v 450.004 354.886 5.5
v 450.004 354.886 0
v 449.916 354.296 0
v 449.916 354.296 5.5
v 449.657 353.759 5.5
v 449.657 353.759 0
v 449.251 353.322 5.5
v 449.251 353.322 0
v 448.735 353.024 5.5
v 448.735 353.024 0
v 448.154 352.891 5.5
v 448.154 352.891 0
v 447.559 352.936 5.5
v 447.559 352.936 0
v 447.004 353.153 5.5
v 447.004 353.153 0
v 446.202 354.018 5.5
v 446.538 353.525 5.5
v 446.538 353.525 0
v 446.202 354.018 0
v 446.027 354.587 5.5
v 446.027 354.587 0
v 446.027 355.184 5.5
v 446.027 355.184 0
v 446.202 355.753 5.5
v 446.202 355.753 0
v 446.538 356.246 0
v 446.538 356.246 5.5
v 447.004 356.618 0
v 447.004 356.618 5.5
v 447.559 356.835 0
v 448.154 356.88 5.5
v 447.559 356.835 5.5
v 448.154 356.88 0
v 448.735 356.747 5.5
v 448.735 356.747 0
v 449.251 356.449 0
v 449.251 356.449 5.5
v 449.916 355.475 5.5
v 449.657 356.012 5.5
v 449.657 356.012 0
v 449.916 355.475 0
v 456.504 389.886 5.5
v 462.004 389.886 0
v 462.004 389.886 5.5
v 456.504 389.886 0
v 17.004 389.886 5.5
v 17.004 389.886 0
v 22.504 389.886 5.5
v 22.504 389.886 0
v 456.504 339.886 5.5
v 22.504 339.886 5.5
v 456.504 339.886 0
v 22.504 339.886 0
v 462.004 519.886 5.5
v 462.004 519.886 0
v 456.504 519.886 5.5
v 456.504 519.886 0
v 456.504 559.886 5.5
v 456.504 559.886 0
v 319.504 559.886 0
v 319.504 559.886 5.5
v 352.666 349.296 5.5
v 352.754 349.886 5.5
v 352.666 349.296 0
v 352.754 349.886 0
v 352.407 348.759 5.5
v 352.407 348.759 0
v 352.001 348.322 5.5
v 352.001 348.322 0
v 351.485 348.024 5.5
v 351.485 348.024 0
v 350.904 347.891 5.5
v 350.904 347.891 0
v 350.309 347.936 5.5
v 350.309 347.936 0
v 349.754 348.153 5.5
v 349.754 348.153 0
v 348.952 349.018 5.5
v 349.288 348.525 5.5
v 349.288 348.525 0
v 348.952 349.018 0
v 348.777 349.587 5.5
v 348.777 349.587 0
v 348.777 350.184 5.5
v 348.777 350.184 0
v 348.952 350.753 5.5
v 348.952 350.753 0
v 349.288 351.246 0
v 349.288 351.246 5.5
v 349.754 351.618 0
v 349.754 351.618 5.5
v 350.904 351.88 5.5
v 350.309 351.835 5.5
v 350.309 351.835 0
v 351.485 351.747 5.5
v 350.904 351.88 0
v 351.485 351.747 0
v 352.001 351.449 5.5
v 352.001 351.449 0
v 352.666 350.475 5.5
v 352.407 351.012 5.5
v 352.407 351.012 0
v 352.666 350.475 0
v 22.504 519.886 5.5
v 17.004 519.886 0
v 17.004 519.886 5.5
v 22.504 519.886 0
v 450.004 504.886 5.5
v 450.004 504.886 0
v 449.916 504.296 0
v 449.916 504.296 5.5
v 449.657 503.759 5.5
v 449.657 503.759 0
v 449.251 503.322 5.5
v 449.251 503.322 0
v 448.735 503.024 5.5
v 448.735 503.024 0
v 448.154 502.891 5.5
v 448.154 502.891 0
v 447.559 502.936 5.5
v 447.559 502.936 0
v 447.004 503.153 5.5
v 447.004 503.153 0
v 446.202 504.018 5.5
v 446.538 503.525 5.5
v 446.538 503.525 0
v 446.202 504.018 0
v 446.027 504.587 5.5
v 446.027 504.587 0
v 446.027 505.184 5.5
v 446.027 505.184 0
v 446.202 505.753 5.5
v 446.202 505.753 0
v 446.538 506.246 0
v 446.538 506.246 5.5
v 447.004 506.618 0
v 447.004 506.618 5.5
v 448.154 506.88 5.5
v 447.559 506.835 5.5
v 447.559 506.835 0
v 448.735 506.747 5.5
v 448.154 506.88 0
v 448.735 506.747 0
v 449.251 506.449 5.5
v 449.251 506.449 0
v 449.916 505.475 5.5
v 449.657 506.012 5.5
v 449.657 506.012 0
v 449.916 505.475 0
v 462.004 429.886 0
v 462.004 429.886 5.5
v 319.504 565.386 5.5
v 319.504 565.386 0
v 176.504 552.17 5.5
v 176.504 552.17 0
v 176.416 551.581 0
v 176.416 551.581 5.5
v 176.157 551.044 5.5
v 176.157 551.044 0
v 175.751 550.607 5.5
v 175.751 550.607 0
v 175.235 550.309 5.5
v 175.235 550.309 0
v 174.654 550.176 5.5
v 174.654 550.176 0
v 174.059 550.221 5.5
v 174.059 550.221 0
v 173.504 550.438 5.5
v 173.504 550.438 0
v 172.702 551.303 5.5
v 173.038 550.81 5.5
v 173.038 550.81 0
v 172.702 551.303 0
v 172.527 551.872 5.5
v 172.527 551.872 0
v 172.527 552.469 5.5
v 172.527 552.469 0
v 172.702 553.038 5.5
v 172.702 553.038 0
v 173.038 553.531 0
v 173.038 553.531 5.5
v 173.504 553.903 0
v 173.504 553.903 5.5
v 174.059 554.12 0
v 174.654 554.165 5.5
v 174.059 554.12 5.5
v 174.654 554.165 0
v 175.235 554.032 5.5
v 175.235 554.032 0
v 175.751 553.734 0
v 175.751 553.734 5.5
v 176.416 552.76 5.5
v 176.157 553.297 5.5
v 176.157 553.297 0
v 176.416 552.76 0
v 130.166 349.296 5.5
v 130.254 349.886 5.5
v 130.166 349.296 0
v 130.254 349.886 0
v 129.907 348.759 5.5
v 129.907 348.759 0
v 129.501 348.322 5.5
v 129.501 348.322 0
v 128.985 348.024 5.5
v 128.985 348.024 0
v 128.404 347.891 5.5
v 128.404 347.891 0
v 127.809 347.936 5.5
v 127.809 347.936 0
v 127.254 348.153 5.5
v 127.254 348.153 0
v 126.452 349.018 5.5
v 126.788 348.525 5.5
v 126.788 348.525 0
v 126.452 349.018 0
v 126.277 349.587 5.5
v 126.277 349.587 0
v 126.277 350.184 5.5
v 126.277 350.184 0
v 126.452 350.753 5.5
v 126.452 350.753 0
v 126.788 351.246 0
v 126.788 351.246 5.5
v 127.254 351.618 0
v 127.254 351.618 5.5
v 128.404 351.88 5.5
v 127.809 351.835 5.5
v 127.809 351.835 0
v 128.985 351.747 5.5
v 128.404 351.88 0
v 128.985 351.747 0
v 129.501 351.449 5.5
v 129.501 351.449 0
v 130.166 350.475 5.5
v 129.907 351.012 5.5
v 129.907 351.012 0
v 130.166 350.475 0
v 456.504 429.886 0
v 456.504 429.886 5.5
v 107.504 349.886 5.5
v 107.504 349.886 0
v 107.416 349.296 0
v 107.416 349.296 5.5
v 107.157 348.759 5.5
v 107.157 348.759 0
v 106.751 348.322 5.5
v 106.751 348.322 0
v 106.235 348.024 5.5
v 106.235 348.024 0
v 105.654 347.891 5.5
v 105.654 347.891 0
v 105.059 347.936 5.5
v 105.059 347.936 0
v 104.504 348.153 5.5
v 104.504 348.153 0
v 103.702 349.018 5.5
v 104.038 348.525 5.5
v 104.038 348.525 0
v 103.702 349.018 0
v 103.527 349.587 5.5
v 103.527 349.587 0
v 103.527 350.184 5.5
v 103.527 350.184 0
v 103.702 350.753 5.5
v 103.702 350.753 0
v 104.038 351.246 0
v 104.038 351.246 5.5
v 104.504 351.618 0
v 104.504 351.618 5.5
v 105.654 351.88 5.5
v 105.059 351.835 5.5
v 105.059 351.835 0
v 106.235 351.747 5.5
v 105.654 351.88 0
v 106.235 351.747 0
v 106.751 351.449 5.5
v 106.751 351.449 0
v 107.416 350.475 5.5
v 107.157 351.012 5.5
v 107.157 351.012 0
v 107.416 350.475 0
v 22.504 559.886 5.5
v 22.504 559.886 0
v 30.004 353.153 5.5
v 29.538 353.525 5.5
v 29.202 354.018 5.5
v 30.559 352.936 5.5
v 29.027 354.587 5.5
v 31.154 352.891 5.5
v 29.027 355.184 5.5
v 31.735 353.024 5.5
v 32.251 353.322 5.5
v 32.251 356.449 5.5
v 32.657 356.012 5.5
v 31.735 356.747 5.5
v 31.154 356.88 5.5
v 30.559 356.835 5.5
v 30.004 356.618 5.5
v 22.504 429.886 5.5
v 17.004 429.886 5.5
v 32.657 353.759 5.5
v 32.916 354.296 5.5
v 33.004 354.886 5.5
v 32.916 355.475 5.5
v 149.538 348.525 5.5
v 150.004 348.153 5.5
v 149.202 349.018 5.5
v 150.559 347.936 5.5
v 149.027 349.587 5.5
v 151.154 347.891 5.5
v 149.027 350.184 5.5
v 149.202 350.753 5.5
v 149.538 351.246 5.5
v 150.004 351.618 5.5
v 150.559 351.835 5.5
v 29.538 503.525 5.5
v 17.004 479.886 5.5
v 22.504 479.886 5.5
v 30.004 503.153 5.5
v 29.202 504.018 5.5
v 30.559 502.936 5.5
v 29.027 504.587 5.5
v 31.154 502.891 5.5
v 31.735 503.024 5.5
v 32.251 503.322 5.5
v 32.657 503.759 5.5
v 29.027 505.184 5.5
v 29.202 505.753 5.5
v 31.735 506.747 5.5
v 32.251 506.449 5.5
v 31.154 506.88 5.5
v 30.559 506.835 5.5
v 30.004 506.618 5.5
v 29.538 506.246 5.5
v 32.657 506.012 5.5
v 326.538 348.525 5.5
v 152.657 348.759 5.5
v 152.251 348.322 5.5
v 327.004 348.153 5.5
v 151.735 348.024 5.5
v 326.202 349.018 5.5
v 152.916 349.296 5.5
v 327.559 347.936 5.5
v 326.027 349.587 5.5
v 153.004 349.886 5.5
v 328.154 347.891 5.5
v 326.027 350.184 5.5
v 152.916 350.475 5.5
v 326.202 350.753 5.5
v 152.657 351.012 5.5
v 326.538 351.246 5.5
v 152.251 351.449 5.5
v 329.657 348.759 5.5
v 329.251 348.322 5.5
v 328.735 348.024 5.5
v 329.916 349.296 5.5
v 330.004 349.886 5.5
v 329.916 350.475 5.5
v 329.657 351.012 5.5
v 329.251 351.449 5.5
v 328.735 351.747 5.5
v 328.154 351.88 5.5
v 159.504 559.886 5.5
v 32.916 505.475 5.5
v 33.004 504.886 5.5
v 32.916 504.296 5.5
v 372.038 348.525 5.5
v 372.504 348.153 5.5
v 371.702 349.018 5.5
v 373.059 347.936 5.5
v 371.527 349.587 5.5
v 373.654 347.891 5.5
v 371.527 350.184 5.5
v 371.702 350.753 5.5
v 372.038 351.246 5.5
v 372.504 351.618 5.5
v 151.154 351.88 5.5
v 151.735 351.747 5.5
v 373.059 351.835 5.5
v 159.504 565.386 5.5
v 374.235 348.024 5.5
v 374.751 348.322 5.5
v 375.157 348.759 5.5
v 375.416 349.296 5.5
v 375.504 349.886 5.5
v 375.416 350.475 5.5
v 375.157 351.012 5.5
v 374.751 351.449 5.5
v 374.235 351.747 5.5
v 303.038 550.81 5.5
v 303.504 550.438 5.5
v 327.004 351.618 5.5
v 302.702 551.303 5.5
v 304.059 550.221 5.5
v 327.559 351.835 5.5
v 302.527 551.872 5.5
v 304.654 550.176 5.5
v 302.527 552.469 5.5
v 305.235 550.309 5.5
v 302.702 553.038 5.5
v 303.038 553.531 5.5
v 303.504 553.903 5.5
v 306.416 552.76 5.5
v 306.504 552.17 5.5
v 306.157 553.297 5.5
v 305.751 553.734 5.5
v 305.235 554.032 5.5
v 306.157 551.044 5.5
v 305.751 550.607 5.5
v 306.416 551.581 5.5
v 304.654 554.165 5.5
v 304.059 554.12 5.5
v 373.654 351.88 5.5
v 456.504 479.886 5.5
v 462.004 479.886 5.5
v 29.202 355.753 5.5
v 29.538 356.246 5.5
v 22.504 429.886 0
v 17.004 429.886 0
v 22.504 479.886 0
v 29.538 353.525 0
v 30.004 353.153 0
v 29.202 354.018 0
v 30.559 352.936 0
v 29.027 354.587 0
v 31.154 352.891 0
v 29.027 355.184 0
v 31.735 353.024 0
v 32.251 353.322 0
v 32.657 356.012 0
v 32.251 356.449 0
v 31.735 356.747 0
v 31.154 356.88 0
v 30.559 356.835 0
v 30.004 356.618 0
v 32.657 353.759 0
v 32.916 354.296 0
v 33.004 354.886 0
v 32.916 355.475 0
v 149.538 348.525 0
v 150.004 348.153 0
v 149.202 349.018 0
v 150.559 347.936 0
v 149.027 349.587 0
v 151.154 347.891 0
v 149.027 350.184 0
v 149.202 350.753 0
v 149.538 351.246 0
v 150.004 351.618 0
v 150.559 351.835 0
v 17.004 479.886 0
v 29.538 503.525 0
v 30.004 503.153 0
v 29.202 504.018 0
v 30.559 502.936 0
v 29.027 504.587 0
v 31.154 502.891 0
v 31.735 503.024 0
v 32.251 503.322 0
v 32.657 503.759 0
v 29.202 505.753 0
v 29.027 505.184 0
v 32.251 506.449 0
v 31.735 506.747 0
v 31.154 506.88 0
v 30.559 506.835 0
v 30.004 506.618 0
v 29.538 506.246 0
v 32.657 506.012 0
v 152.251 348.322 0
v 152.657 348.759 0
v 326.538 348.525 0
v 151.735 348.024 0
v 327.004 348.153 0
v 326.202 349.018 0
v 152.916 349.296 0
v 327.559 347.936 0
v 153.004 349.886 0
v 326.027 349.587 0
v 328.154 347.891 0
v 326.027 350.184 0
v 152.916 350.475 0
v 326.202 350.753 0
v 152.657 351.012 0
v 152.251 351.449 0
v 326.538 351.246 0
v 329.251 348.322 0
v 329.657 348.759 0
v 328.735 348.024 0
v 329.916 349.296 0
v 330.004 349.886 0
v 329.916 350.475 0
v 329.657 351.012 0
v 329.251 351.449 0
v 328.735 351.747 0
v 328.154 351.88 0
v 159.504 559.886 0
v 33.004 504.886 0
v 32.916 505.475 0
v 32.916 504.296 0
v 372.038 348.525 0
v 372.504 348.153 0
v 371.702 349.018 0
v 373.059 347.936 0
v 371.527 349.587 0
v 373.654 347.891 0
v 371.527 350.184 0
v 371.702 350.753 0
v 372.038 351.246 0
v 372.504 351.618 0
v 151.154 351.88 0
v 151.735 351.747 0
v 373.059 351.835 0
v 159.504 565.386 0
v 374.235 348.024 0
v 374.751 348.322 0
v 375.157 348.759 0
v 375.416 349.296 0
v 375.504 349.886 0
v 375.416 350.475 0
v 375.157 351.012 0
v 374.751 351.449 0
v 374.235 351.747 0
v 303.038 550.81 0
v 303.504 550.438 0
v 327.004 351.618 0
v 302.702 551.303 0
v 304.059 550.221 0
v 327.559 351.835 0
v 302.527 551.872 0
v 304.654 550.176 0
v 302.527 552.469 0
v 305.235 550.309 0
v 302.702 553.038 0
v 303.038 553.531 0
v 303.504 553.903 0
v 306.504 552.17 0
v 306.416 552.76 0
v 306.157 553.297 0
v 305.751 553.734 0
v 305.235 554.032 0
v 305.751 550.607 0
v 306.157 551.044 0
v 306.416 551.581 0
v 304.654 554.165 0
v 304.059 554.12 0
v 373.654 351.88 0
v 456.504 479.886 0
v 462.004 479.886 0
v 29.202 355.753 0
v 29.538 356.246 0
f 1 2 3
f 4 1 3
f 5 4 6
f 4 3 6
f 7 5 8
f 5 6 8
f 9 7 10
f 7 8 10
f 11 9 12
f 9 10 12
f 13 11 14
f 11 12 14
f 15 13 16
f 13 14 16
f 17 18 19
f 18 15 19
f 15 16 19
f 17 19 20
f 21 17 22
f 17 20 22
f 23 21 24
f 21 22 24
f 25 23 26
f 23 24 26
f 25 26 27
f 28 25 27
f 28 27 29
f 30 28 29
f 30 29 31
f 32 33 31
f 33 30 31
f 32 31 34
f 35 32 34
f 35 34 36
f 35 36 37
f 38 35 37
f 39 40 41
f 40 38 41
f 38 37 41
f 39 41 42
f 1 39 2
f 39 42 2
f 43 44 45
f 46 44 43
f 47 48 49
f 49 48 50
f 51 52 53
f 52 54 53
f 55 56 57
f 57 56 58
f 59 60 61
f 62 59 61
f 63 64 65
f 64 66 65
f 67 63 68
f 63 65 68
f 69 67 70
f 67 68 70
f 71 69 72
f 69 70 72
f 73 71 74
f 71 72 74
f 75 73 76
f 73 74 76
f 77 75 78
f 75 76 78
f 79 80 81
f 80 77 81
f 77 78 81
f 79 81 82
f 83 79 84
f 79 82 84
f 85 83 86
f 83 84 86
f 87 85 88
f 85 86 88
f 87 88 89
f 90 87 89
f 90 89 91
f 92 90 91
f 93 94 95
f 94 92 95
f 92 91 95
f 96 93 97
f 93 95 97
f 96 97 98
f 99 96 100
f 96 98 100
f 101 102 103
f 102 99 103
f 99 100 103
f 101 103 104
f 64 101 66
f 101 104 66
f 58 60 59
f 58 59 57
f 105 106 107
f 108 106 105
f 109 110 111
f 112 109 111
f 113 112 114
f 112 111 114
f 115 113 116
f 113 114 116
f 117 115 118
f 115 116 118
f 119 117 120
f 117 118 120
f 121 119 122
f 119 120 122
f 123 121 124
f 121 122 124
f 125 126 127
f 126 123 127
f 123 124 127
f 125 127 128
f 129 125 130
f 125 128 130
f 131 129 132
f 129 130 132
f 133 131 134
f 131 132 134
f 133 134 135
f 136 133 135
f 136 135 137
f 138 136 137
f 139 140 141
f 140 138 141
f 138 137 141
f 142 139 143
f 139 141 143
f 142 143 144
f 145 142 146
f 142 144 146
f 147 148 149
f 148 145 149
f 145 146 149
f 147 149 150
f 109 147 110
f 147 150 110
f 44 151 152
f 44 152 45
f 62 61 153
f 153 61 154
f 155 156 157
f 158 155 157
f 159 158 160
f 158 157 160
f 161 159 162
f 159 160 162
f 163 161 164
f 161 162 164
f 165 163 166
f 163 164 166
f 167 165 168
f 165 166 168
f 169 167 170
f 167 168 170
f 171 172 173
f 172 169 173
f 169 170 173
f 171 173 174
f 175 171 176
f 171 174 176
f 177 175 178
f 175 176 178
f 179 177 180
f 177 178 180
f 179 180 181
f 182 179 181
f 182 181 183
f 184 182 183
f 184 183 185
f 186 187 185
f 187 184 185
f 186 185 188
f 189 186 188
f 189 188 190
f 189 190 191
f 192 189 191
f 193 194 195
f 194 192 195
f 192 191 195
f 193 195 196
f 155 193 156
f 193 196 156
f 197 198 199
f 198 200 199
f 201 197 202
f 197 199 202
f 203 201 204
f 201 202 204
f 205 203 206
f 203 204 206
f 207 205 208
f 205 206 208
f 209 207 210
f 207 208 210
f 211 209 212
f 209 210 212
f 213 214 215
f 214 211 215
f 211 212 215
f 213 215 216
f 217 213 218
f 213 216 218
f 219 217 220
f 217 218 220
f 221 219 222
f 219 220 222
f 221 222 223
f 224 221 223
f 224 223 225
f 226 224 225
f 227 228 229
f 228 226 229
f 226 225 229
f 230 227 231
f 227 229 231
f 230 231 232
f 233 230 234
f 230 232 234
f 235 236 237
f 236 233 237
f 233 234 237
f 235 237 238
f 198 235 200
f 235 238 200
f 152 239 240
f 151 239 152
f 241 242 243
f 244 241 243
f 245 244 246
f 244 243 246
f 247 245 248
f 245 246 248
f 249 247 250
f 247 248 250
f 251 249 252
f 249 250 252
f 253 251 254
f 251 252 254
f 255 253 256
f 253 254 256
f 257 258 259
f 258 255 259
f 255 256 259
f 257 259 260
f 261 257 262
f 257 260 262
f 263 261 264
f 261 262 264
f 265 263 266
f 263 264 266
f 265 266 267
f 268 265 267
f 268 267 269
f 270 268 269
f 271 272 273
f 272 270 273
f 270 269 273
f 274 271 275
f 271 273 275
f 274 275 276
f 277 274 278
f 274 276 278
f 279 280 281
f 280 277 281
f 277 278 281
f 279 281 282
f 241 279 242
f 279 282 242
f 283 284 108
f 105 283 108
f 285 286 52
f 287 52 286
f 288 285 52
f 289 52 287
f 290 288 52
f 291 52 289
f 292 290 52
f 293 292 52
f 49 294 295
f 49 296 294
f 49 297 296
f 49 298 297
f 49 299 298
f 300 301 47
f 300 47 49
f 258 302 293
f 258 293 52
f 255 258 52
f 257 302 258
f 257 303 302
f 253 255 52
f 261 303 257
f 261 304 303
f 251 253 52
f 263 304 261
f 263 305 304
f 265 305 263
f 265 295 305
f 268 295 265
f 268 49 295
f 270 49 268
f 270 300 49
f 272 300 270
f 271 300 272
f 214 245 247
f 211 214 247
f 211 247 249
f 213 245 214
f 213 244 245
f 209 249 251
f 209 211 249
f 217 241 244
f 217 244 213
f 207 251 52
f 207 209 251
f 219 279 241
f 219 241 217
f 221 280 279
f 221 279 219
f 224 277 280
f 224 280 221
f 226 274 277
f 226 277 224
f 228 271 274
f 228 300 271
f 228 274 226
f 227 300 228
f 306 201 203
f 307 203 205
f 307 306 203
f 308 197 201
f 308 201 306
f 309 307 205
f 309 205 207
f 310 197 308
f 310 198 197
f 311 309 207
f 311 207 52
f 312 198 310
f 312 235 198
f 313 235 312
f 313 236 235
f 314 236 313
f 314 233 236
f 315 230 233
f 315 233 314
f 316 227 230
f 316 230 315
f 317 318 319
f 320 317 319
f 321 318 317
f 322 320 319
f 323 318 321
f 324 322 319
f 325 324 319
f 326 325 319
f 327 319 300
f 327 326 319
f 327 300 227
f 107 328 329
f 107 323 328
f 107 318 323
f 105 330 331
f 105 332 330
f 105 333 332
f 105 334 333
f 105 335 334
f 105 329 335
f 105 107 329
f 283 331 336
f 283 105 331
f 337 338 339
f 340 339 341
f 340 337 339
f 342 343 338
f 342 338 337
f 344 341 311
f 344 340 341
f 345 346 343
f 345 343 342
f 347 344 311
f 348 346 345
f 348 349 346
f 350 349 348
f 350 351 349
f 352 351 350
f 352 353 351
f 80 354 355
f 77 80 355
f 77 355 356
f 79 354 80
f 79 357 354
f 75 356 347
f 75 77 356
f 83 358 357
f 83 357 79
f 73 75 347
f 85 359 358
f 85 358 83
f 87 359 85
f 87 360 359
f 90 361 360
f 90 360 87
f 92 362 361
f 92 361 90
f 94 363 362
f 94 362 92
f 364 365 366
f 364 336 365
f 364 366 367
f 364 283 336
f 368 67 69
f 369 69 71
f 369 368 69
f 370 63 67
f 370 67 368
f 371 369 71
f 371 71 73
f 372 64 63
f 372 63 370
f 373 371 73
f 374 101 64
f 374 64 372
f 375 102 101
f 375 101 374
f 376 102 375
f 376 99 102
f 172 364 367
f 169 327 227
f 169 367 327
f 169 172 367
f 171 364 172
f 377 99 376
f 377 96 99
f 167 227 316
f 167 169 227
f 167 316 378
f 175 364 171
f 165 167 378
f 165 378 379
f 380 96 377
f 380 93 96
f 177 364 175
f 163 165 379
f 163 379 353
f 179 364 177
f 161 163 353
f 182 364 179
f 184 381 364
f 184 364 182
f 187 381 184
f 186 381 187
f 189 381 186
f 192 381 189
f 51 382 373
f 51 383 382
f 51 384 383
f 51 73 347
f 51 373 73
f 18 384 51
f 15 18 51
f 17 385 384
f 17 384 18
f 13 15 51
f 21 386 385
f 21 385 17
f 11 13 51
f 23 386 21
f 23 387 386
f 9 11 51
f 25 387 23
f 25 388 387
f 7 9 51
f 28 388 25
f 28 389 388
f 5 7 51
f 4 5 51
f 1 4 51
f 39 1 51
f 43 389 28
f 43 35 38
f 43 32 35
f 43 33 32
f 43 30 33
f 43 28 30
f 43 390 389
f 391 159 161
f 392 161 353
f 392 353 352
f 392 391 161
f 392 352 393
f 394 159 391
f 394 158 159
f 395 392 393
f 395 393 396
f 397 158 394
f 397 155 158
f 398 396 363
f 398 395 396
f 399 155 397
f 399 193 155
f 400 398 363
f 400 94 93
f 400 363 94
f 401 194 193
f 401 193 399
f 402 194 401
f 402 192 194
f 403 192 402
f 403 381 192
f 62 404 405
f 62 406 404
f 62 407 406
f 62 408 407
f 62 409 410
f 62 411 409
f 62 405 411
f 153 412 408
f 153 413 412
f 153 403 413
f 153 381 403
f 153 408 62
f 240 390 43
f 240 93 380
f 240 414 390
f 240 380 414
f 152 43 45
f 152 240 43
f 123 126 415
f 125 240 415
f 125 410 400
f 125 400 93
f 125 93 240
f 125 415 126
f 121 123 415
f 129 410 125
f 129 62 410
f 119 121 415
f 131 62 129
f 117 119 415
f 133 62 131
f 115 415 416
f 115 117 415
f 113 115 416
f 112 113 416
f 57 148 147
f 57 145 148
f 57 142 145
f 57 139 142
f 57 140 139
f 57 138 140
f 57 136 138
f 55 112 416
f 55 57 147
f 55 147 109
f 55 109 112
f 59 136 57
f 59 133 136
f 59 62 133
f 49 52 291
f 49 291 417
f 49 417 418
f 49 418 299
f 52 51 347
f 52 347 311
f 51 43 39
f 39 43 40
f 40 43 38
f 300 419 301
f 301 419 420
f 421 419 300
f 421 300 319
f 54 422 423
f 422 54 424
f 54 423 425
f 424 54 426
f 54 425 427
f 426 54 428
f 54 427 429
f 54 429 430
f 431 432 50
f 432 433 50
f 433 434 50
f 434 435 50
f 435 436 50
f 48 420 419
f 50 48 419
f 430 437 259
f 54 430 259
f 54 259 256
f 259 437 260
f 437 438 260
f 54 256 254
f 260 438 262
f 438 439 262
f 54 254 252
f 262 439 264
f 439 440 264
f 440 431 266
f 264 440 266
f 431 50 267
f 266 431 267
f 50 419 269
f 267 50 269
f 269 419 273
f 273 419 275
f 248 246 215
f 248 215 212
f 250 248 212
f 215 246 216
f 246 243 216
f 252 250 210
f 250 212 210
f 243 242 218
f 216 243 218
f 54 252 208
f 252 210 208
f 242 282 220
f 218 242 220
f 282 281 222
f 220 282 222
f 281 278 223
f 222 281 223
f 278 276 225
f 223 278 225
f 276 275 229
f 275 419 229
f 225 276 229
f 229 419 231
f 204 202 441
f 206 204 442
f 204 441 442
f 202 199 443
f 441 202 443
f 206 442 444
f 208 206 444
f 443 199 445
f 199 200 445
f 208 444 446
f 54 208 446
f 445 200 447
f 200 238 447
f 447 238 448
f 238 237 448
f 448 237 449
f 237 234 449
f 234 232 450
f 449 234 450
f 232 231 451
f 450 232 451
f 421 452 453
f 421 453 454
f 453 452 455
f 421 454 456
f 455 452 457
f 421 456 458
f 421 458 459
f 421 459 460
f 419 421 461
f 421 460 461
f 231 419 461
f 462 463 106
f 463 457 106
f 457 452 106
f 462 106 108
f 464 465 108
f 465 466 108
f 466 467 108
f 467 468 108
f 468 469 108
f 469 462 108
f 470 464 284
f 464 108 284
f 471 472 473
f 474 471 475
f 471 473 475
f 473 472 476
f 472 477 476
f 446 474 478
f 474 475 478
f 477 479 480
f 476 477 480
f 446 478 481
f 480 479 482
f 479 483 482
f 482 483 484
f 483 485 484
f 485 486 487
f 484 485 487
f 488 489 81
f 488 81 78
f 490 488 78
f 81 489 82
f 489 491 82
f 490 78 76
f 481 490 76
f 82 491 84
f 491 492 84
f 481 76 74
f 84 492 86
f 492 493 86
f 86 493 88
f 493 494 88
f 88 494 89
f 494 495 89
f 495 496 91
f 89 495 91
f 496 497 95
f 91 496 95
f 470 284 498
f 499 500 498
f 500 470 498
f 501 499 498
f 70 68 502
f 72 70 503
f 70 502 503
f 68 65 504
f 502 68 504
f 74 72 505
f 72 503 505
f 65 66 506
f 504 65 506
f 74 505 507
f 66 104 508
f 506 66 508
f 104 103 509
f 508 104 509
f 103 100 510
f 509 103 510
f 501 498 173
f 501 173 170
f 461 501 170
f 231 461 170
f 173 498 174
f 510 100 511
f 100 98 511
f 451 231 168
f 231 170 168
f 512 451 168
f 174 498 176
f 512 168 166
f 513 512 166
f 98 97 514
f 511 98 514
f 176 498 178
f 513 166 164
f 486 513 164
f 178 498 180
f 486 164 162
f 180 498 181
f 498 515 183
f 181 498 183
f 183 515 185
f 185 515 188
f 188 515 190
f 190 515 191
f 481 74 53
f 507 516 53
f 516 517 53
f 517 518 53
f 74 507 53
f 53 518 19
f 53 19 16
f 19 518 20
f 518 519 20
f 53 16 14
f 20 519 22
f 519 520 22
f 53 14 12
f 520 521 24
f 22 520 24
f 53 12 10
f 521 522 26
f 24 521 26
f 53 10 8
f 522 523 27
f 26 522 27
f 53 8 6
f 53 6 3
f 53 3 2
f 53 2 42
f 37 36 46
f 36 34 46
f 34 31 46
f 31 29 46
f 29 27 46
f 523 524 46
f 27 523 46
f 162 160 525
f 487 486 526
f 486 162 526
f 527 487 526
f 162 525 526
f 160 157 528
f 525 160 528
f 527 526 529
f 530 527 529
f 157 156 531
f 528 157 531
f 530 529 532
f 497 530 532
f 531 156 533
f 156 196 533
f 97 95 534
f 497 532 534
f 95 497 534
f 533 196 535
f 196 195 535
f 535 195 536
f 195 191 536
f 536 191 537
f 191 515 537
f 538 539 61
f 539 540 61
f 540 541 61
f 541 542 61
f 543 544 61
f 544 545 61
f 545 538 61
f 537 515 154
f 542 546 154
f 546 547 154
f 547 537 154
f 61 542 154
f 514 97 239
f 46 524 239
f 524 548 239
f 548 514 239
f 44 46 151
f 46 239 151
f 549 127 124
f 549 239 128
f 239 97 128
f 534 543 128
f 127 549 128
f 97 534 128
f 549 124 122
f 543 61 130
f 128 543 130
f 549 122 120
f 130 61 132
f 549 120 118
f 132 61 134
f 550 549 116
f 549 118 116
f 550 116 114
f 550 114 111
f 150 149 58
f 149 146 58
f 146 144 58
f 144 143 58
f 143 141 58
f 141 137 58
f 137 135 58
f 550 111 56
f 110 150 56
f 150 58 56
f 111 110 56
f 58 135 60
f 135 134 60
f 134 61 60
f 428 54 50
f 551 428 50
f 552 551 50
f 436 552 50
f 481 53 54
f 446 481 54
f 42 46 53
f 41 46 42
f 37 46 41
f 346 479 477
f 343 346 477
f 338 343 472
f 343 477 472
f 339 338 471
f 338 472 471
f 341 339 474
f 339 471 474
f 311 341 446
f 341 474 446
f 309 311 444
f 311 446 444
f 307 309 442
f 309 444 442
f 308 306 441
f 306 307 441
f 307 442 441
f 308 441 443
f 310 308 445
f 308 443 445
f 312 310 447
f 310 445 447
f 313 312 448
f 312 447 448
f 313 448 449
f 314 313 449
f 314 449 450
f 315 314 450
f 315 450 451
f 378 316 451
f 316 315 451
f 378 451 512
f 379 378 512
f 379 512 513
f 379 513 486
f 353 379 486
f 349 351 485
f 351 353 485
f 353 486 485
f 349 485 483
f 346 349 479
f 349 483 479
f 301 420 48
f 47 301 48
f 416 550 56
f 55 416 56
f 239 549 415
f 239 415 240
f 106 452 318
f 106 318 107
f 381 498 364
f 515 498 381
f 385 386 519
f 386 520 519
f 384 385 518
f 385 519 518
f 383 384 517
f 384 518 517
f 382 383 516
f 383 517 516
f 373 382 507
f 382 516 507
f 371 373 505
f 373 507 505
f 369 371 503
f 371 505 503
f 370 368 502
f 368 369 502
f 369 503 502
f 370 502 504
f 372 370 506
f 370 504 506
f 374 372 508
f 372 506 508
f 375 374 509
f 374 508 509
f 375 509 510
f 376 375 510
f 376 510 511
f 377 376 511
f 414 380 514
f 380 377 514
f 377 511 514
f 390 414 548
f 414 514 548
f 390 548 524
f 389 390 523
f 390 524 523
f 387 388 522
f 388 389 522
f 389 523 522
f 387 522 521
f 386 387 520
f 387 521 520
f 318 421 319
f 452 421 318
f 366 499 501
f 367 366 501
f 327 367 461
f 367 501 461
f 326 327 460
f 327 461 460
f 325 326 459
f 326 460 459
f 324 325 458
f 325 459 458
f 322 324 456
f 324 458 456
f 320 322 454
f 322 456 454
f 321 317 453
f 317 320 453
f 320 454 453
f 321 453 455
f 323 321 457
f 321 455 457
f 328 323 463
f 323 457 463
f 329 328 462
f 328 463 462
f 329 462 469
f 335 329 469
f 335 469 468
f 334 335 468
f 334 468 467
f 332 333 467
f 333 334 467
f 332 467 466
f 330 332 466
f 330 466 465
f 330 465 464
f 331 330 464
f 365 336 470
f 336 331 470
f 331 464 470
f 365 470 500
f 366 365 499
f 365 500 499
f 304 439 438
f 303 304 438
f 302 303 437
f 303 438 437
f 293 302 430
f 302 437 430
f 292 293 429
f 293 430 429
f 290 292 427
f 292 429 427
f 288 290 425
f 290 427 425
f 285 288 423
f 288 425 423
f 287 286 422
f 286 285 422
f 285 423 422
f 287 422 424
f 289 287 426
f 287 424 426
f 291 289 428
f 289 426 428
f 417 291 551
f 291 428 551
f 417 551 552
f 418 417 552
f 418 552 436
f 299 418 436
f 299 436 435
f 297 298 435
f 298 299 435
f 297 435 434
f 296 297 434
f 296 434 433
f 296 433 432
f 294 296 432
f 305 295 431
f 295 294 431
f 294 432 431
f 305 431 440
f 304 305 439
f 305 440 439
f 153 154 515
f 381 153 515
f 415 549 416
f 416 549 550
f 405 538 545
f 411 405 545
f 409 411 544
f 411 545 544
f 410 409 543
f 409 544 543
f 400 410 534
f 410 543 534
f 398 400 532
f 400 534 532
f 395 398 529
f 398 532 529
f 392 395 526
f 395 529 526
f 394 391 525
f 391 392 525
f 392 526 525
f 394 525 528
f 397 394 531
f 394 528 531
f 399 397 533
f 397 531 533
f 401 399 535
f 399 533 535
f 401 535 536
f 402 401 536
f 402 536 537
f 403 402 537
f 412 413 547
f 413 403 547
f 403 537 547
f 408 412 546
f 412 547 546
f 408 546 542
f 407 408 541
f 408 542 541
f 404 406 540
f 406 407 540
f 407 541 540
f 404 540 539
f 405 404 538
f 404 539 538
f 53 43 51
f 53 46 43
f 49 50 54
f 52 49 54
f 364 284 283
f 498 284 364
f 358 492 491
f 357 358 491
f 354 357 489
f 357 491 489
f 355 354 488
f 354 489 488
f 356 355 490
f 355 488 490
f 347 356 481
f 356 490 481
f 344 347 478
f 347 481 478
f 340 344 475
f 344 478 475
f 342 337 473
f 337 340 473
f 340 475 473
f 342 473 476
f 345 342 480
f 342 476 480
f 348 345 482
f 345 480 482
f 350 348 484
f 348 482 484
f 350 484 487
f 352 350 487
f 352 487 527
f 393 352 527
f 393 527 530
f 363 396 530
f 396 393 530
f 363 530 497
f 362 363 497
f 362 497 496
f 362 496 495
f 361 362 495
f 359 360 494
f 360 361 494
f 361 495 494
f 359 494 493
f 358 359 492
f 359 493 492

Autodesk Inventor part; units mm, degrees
ref_plane "YZ Plane" through (0, 0, 0) normal (1, 0, 0) x (0, 1, 0)
ref_plane "XZ Plane" through (0, 0, 0) normal (0, 1, 0) x (-1, 0, 0)
ref_plane "XY Plane" through (0, 0, 0) normal (0, 0, 1) x (1, 0, 0)
sketch "Sketch1" plane through (0, 0, 0) normal (0, 0, 1) x (1, 0, 0)
  line L0 (456.5044, 429.8855) -> (462.0044, 429.8855)
  line L1 (462.0044, 429.8855) -> (462.0044, 389.8855)
  line L2 (462.0044, 389.8855) -> (456.5044, 389.8855)
  line L3 (456.5044, 389.8855) -> (456.5044, 339.8855)
  line L4 (456.5044, 339.8855) -> (462.0044, 339.8855)
  line L5 (462.0044, 339.8855) -> (462.0044, 339.8855)
  line L6 (22.5044, 429.8855) -> (17.0044, 429.8855)
  line L7 (17.0044, 429.8855) -> (17.0044, 389.8855)
  line L8 (17.0044, 389.8855) -> (22.5044, 389.8855)
  line L9 (22.5044, 389.8855) -> (22.5044, 339.8855)
  line L10 (22.5044, 339.8855) -> (17.0044, 339.8855)
  line L11 (17.0044, 339.8855) -> (17.0044, 339.8855)
  line L12 (17.0044, 339.8855) -> (462.0044, 339.8855)
  line L13 (22.5044, 559.8855) -> (159.5044, 559.8855)
  line L14 (159.5044, 559.8855) -> (159.5044, 565.3855)
  line L15 (456.5044, 559.8855) -> (319.5044, 559.8855)
  line L16 (319.5044, 559.8855) -> (319.5044, 565.3855)
  line L17 (319.5044, 565.3855) -> (159.5044, 565.3855)
  circle A0 centre (174.5044, 552.1705) radius 2
  circle A1 centre (304.5044, 552.1705) radius 2
  line L18 (22.5044, 429.8855) -> (22.5044, 479.8855)
  line L19 (22.5044, 479.8855) -> (17.0044, 479.8855)
  line L20 (17.0044, 479.8855) -> (17.0044, 519.8855)
  line L21 (17.0044, 519.8855) -> (22.5044, 519.8855)
  line L22 (22.5044, 559.8855) -> (22.5044, 519.8855)
  line L23 (22.5044, 479.8855) -> (22.5044, 429.8855)
  line L24 (456.5044, 479.8855) -> (462.0044, 479.8855)
  line L25 (462.0044, 479.8855) -> (462.0044, 519.8855)
  line L26 (462.0044, 519.8855) -> (456.5044, 519.8855)
  line L27 (456.5044, 559.8855) -> (456.5044, 519.8855)
  line L28 (456.5044, 479.8855) -> (456.5044, 429.8855)
  circle A2 centre (105.5044, 349.8855) radius 2
  circle A3 centre (151.0044, 349.8855) radius 2
  circle A4 centre (128.2544, 349.8855) radius 2
  circle A5 centre (328.0044, 349.8855) radius 2
  circle A6 centre (350.7544, 349.8855) radius 2
  circle A7 centre (373.5044, 349.8855) radius 2
  circle A8 centre (31.0044, 504.8855) radius 2
  circle A9 centre (31.0044, 354.8855) radius 2
  circle A10 centre (448.0044, 504.8855) radius 2
  circle A11 centre (448.0044, 354.8855) radius 2
  dimension "d105" = 50
  dimension "d148" = 445
  dimension "d196" = 137
  dimension "d197" = 137
  dimension "d199" = 4
  dimension "d200" = 4
  dimension "d203" = 7.715
  dimension "d204" = 7.715
  dimension "d207" = 5.5
  dimension "d209" = 5.5
  dimension "d211" = 5.5
  dimension "d214" = 4
  dimension "d215" = 4
  dimension "d216" = 4
  dimension "d217" = 4
  dimension "d218" = 4
  dimension "d219" = 4
  dimension "d221" = 22.75
  dimension "d222" = 22.75
  dimension "d224" = 22.75
  dimension "d225" = 22.75
  dimension "d226" = 4
  dimension "d227" = 4
  dimension "d234" = 90
  dimension "d235" = 90
  dimension "d236" = 90
  dimension "d238" = 55
  dimension "d244" = 160
  dimension "d245" = 5.5
  dimension "d246" = 5.5
  dimension "d247" = 5.5
  dimension "d248" = 5.5
  dimension "d249" = 5.5
  dimension "d250" = 5.5
  dimension "d251" = 8.5
  dimension "d252" = 8.5
  dimension "d253" = 150
  dimension "d254" = 152
  dimension "d255" = 152
  dimension "d256" = 55
  dimension "d257" = 8.5
  dimension "d258" = 4
  dimension "d259" = 8.5
  dimension "d260" = 150
  dimension "d261" = 10
  dimension "d262" = 10
  dimension "d263" = 10
  dimension "d264" = 10
  dimension "d265" = 10
  dimension "d266" = 10
  dimension "d269" = 40
  dimension "d270" = 40
  dimension "d271" = 40
  dimension "d272" = 50
  dimension "d273" = 40
  dimension "d274" = 40
  dimension "d275" = 50
  dimension "d276" = 40
  dimension "d277" = 50
  dimension "d280" = 0
  dimension "d281" = 0
  dimension "d282" = 0
  dimension "d283" = 90
  dimension "d284" = 90
extrude "Extrusion1" add sketch "Sketch1" along normal blind 5.5
properties part number "Techo Carcasa" material "MDF Medium Density Fiberboard"
